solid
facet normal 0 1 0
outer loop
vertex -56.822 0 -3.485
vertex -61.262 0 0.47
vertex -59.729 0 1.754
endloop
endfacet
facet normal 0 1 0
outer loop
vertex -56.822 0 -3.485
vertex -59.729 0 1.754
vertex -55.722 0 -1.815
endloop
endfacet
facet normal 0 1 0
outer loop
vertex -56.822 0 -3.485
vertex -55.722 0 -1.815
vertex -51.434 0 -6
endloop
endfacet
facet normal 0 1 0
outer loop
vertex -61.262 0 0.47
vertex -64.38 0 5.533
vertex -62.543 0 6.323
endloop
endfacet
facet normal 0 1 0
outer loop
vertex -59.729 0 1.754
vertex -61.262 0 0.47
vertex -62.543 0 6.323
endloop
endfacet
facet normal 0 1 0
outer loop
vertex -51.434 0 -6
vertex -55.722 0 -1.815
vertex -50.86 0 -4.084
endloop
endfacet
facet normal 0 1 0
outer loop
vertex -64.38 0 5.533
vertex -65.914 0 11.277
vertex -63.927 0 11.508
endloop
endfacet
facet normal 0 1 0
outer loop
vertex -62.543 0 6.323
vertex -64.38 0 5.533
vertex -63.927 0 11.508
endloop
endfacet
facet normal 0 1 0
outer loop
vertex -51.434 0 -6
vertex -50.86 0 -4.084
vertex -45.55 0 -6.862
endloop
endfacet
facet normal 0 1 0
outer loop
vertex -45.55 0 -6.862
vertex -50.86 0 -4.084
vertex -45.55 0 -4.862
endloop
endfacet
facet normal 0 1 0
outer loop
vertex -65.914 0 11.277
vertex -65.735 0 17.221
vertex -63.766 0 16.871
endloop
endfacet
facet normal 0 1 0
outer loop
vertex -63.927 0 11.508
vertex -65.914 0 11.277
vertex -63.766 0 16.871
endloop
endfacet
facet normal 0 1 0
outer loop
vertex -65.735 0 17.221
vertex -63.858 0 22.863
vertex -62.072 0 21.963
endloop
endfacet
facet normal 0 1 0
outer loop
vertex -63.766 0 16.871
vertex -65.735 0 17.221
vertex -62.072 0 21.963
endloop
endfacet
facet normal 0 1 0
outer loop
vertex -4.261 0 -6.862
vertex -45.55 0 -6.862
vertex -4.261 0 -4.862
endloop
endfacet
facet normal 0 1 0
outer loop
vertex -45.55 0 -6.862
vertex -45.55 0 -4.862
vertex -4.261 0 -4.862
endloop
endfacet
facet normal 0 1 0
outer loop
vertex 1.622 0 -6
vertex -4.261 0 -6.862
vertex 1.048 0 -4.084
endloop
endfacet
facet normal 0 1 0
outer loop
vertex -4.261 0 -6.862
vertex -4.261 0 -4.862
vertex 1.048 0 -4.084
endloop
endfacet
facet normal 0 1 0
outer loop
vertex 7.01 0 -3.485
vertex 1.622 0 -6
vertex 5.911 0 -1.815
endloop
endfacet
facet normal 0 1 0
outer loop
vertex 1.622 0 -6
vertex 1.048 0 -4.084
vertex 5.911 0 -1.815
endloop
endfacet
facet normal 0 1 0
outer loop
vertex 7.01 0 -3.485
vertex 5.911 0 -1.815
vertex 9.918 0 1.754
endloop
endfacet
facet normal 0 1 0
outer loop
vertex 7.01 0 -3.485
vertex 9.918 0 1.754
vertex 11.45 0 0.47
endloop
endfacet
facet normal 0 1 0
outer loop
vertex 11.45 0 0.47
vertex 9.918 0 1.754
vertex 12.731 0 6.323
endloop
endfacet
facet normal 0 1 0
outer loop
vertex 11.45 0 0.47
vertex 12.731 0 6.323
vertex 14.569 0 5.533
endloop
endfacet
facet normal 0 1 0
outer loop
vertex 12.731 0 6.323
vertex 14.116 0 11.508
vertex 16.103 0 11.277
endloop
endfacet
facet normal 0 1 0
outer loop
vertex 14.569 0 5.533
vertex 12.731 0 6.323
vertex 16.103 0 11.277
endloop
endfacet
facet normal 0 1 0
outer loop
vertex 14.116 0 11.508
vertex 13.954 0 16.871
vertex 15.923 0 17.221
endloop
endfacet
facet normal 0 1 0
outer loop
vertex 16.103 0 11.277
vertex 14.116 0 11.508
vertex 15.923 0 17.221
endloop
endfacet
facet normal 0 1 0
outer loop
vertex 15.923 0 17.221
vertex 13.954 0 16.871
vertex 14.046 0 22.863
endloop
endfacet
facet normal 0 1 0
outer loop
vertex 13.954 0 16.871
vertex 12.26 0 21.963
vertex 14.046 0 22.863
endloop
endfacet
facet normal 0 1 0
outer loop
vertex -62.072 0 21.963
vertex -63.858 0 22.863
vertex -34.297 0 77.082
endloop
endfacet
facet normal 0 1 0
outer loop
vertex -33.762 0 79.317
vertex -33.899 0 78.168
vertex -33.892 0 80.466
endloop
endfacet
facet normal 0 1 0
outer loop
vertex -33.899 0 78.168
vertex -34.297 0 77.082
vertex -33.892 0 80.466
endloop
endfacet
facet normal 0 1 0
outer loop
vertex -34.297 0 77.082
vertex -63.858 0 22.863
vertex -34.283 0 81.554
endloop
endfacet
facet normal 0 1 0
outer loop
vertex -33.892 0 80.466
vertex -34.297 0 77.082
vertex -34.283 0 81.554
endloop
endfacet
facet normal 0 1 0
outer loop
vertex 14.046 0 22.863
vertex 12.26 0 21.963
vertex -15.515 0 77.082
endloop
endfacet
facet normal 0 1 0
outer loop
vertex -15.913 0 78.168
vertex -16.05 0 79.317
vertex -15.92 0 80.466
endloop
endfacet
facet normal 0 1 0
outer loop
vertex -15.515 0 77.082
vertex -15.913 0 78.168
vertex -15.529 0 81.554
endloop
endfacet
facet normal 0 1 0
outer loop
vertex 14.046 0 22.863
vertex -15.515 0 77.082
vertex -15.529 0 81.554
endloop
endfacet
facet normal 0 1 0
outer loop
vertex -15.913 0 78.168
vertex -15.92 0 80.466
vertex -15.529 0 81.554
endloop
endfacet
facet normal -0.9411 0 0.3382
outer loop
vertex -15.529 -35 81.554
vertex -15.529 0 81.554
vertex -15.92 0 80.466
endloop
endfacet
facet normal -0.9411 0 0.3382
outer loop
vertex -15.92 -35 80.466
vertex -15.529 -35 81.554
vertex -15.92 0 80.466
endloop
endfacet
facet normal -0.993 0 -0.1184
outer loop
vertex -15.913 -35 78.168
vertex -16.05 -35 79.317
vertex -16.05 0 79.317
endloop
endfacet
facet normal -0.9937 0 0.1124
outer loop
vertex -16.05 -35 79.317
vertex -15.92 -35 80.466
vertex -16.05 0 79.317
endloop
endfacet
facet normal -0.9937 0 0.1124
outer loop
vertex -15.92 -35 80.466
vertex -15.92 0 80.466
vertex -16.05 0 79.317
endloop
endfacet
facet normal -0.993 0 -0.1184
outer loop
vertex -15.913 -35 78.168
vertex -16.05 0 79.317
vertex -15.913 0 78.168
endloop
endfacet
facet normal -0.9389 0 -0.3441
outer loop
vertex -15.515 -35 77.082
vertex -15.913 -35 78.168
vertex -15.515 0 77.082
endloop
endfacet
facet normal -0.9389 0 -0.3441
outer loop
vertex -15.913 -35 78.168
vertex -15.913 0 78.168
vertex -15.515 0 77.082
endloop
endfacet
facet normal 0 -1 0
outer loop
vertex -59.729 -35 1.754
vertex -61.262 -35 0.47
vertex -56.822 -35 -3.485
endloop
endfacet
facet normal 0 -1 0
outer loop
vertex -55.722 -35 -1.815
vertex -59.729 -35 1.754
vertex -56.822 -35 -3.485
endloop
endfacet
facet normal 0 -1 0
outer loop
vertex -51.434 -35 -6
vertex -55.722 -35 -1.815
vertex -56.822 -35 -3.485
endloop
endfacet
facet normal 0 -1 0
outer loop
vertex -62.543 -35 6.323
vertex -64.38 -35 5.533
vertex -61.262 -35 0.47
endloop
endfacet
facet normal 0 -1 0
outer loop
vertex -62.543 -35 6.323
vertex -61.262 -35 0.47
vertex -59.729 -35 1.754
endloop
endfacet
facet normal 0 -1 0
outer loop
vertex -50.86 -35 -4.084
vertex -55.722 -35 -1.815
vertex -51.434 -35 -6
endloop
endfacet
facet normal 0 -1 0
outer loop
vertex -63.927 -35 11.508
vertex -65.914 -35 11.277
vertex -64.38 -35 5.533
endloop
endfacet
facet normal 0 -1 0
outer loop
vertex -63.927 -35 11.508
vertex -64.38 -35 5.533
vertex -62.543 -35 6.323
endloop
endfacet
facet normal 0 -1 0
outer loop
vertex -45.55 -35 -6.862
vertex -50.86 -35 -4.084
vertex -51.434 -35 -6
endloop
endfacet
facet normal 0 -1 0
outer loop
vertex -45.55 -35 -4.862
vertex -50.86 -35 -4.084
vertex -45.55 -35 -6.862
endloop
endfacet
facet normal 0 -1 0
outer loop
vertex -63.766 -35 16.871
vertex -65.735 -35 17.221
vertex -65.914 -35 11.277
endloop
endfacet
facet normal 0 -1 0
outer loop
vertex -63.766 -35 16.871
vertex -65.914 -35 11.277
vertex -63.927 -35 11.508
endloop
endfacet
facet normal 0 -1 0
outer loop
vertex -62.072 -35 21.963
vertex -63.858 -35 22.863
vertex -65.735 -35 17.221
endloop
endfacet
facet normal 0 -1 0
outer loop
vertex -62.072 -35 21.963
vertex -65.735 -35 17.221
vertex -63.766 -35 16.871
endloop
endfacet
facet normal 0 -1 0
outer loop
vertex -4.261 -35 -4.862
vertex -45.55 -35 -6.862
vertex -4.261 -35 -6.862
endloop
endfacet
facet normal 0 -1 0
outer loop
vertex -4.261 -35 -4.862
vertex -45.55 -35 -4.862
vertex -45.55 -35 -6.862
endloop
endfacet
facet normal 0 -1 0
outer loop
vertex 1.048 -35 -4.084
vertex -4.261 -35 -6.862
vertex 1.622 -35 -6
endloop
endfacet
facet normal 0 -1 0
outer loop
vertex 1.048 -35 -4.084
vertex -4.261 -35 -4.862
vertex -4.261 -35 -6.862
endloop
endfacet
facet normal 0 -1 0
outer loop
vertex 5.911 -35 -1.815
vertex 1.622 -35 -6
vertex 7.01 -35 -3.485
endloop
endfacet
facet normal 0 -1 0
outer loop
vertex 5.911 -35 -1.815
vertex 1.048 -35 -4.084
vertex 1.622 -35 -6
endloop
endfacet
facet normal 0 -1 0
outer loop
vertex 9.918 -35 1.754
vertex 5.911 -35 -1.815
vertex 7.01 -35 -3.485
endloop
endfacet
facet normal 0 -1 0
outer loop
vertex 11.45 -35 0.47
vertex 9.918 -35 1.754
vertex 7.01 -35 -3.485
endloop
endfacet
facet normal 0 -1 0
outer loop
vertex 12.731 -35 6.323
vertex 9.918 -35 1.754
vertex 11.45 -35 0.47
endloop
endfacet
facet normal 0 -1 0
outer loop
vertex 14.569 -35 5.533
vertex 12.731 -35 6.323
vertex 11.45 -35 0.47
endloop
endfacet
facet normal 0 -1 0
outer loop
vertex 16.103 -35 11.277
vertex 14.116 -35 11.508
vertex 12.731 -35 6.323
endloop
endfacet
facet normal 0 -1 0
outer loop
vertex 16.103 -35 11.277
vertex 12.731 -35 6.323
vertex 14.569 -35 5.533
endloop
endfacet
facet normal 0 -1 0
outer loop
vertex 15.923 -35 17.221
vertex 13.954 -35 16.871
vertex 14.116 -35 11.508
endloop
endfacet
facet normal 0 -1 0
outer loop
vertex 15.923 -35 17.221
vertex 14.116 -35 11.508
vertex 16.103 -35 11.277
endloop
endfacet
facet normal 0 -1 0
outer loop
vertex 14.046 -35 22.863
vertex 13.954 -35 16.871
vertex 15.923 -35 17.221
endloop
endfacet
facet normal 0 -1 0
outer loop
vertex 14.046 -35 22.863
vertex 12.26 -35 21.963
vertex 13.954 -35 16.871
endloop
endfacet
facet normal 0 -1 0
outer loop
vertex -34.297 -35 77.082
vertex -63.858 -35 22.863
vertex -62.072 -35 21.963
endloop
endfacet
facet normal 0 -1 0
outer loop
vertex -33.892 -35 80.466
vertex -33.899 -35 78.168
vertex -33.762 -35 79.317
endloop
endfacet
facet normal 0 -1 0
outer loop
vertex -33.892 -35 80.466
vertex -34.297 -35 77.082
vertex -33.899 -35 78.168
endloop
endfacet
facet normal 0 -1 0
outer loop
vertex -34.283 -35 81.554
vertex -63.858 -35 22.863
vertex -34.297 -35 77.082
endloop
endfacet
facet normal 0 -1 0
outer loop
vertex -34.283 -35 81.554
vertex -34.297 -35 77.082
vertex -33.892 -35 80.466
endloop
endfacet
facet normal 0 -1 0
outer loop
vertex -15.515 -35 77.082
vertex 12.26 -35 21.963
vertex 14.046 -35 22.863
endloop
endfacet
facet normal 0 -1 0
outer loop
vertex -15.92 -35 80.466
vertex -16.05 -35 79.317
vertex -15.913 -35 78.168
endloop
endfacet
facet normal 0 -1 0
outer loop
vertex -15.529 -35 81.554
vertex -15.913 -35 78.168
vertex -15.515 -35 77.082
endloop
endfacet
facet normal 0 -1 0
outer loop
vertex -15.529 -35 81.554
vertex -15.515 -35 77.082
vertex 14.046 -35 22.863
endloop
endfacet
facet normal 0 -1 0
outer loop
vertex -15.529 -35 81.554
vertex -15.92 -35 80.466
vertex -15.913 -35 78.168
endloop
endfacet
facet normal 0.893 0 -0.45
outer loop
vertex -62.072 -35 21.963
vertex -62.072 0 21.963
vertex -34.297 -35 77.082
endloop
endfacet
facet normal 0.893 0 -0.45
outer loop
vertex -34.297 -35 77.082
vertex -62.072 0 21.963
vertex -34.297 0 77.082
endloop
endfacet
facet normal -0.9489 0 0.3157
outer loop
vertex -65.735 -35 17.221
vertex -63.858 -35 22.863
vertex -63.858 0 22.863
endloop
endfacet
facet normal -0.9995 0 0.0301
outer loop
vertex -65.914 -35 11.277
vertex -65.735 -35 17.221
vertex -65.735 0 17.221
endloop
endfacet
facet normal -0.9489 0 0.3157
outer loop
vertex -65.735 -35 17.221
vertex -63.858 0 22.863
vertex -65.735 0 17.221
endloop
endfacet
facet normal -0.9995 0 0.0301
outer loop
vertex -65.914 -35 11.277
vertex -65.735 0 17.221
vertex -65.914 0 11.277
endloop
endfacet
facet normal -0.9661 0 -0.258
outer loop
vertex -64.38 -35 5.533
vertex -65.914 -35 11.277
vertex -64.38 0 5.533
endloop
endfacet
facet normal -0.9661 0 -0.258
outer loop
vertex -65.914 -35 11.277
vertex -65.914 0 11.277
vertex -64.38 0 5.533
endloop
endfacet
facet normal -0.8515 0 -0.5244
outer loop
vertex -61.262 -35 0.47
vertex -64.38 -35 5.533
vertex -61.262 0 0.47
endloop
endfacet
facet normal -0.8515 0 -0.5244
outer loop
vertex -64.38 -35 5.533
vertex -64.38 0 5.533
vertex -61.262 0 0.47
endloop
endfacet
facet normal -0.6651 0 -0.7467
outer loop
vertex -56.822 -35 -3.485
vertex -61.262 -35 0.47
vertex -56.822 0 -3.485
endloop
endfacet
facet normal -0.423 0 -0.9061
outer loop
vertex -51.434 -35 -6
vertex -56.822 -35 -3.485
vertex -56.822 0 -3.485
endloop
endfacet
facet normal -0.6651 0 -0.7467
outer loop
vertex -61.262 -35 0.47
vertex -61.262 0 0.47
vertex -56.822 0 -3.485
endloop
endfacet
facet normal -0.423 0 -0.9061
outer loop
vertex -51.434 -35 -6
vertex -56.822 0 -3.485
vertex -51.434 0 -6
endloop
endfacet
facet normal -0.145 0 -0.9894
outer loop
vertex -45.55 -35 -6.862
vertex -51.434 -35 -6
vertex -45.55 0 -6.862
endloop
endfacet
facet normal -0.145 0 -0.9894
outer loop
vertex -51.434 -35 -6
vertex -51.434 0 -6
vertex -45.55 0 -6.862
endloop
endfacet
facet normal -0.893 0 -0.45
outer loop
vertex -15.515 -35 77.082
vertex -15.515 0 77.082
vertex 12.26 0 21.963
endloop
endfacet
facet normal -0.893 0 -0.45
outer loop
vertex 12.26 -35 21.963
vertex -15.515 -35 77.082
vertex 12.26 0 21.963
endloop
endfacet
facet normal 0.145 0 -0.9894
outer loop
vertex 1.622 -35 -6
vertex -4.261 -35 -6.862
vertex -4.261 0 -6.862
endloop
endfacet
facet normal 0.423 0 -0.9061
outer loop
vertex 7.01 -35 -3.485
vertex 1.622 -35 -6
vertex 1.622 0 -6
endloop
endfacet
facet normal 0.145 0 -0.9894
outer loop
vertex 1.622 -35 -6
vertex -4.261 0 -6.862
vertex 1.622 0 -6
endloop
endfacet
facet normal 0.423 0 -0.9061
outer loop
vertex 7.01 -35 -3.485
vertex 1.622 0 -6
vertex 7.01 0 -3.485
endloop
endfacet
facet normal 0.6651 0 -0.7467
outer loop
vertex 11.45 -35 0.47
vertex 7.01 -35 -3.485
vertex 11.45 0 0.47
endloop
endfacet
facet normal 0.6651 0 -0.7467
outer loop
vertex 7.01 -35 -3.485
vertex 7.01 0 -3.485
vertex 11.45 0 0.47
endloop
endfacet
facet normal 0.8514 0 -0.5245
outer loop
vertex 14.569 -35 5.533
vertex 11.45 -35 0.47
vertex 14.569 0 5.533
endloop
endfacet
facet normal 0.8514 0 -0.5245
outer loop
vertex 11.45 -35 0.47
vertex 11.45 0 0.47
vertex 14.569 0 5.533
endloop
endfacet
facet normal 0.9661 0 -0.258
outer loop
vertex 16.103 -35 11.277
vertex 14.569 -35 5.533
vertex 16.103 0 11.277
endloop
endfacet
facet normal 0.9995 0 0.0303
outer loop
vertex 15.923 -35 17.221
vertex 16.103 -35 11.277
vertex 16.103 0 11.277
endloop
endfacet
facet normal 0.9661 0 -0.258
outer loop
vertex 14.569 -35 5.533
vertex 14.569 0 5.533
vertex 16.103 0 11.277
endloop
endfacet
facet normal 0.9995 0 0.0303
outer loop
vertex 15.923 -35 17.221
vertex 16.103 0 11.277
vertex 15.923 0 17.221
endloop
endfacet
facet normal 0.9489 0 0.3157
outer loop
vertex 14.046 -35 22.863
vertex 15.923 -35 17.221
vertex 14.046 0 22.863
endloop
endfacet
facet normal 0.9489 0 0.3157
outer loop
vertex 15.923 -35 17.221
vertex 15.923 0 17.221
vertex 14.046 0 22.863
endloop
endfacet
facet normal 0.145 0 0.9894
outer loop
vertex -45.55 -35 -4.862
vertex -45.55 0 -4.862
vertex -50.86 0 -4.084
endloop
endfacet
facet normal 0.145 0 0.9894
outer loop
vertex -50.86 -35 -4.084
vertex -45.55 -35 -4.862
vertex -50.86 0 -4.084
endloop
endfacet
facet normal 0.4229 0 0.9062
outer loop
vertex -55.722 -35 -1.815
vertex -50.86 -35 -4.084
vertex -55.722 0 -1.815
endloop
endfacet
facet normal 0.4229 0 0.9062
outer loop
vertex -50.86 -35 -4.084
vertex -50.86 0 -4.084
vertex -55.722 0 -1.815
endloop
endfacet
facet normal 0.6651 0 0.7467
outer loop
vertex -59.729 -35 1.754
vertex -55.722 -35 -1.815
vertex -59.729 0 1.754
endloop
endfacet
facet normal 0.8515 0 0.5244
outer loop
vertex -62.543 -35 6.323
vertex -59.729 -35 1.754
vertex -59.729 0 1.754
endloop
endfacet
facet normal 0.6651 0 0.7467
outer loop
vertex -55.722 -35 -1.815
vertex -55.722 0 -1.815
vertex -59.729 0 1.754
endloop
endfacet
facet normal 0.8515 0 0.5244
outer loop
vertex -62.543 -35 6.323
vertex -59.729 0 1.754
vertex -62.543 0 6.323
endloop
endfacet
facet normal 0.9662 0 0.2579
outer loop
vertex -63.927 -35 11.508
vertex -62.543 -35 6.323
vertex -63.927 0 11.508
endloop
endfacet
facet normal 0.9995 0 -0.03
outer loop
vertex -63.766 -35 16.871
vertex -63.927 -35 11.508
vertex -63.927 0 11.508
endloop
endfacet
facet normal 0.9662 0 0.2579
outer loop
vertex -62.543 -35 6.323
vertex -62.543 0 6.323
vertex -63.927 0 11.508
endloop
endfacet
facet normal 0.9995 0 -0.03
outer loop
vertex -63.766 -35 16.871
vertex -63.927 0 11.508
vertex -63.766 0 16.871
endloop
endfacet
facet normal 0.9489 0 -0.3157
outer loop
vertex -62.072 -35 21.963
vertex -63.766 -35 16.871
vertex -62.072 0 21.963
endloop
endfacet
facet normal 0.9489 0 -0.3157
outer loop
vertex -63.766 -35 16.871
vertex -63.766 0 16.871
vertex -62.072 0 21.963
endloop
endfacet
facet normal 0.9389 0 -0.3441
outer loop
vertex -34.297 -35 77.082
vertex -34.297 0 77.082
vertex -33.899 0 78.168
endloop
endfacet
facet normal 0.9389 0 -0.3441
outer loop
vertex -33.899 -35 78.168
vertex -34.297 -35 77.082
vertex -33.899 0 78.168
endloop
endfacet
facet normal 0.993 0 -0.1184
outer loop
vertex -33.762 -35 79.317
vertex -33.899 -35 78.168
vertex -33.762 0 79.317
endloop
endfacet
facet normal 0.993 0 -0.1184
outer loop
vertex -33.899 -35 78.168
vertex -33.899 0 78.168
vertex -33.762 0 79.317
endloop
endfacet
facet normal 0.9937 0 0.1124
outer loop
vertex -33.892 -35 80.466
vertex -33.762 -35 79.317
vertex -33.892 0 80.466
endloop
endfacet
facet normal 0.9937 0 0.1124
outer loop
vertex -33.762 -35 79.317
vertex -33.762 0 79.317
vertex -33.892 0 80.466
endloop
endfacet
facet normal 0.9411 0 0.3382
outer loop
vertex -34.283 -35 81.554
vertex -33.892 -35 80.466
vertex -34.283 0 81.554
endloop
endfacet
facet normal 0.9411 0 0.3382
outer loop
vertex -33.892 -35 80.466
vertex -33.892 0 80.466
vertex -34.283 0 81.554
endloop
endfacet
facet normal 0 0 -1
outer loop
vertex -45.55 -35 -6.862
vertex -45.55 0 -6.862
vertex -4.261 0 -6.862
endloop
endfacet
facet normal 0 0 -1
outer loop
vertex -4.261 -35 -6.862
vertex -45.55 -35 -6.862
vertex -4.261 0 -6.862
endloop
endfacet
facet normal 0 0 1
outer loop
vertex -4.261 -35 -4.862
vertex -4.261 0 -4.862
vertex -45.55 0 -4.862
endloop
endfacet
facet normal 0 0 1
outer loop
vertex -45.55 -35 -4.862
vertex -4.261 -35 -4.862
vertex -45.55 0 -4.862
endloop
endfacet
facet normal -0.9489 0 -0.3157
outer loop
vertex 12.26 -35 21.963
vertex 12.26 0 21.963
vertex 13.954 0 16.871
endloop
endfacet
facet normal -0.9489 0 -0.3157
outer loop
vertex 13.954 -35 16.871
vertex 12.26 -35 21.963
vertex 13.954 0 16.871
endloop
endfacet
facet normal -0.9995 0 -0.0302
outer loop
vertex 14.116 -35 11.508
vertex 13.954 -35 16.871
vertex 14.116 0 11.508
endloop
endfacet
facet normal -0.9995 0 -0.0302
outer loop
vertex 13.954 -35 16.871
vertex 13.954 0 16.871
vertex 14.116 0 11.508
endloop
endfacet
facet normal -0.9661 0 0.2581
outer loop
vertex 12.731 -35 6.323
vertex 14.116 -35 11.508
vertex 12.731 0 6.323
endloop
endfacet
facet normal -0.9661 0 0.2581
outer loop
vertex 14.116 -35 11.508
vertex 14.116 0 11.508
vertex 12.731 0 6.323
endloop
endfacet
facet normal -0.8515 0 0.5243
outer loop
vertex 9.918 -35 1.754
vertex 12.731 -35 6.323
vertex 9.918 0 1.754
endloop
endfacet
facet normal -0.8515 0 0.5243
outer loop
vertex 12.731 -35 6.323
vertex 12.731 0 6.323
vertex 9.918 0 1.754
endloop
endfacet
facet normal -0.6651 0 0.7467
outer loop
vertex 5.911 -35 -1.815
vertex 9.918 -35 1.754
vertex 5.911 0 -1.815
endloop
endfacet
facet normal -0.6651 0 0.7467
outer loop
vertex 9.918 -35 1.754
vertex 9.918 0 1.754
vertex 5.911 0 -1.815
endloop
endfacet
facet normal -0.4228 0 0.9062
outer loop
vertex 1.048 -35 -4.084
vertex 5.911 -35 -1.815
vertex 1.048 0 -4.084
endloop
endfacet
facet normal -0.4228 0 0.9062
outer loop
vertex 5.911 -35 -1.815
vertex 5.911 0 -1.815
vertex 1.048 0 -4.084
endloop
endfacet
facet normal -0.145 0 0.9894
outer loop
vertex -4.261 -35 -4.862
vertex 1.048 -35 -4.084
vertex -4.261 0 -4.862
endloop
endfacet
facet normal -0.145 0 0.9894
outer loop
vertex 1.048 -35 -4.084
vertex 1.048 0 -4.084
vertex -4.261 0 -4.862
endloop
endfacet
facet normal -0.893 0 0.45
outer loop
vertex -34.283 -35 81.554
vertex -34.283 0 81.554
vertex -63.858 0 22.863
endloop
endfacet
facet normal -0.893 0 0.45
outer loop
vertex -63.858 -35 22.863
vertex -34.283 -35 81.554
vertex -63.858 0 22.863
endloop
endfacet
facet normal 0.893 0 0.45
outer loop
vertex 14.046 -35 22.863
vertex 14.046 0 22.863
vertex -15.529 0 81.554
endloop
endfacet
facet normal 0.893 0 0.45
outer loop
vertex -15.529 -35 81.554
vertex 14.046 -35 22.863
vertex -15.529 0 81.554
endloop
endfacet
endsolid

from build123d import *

# Parameters (mm, degrees)
F1_DEPTH    = 35
F2_T1_DEPTH = 55


# Not quite as in the source:
# - a fillet or chamfer that OpenCascade refuses, or shapes differently, is made with other operations: its cross-section is extruded or revolved along the edge and cut away or added


with BuildPart() as f1:
    # F0 (on Front) → F1 (new body)
    with BuildSketch(Plane.XZ):
        with BuildLine():
            Line((-15.5290191181, 81.5544475097), (-17.315076228, 80.6544475097))
            Line((-17.315076228, 80.6544475097), (12.2598850951, 21.9627031234))
            ThreePointArc((12.2598850951, 21.9627031234), (11.4910392166, 3.9362212778), (-4.2611431719, -4.8622968766))
            Line((-4.2611431719, -4.8622968766), (-45.5504947187, -4.8622968766))
            ThreePointArc((-45.5504947187, -4.8622968766), (-61.3026771072, 3.9362212778), (-62.0715229858, 21.9627031234))
            Line((-62.0715229858, 21.9627031234), (-32.4965616626, 80.6544475097))
            Line((-32.4965616626, 80.6544475097), (-34.2826187726, 81.5544475097))
            Line((-34.2826187726, 81.5544475097), (-63.8575800957, 22.8627031234))
            ThreePointArc((-63.8575800957, 22.8627031234), (-63.0056157438, 2.8874124296), (-45.5504947187, -6.8622968766))
            Line((-45.5504947187, -6.8622968766), (-4.2611431719, -6.8622968766))
            ThreePointArc((-4.2611431719, -6.8622968766), (13.1939778532, 2.8874124296), (14.0459422051, 22.8627031234))
            Line((14.0459422051, 22.8627031234), (-15.5290191181, 81.5544475097))
        make_face()
    extrude(amount=F1_DEPTH)

    # F2: fillet of radius 5 on 2 edges, made by hand

    # F2_s2 → F2_t1 (cut)
    with BuildSketch(Plane.XZ.offset(-10)):
        with BuildLine():
            ThreePointArc((-34.2965616626, 77.0823332898), (-33.7617287381, 79.3167446648), (-34.2826187726, 81.5544475097))
            Line((-34.2826187726, 81.5544475097), (-32.4965616626, 80.6544475097))
            Line((-32.4965616626, 80.6544475097), (-34.2965616626, 77.0823332898))
        make_face()
        with BuildLine():
            ThreePointArc((-15.5290191181, 81.5544475097), (-16.0499091526, 79.3167446648), (-15.515076228, 77.0823332898))
            Line((-15.515076228, 77.0823332898), (-17.315076228, 80.6544475097))
            Line((-17.315076228, 80.6544475097), (-15.5290191181, 81.5544475097))
        make_face()
    extrude(amount=F2_T1_DEPTH, mode=Mode.SUBTRACT)


solid = f1.part
